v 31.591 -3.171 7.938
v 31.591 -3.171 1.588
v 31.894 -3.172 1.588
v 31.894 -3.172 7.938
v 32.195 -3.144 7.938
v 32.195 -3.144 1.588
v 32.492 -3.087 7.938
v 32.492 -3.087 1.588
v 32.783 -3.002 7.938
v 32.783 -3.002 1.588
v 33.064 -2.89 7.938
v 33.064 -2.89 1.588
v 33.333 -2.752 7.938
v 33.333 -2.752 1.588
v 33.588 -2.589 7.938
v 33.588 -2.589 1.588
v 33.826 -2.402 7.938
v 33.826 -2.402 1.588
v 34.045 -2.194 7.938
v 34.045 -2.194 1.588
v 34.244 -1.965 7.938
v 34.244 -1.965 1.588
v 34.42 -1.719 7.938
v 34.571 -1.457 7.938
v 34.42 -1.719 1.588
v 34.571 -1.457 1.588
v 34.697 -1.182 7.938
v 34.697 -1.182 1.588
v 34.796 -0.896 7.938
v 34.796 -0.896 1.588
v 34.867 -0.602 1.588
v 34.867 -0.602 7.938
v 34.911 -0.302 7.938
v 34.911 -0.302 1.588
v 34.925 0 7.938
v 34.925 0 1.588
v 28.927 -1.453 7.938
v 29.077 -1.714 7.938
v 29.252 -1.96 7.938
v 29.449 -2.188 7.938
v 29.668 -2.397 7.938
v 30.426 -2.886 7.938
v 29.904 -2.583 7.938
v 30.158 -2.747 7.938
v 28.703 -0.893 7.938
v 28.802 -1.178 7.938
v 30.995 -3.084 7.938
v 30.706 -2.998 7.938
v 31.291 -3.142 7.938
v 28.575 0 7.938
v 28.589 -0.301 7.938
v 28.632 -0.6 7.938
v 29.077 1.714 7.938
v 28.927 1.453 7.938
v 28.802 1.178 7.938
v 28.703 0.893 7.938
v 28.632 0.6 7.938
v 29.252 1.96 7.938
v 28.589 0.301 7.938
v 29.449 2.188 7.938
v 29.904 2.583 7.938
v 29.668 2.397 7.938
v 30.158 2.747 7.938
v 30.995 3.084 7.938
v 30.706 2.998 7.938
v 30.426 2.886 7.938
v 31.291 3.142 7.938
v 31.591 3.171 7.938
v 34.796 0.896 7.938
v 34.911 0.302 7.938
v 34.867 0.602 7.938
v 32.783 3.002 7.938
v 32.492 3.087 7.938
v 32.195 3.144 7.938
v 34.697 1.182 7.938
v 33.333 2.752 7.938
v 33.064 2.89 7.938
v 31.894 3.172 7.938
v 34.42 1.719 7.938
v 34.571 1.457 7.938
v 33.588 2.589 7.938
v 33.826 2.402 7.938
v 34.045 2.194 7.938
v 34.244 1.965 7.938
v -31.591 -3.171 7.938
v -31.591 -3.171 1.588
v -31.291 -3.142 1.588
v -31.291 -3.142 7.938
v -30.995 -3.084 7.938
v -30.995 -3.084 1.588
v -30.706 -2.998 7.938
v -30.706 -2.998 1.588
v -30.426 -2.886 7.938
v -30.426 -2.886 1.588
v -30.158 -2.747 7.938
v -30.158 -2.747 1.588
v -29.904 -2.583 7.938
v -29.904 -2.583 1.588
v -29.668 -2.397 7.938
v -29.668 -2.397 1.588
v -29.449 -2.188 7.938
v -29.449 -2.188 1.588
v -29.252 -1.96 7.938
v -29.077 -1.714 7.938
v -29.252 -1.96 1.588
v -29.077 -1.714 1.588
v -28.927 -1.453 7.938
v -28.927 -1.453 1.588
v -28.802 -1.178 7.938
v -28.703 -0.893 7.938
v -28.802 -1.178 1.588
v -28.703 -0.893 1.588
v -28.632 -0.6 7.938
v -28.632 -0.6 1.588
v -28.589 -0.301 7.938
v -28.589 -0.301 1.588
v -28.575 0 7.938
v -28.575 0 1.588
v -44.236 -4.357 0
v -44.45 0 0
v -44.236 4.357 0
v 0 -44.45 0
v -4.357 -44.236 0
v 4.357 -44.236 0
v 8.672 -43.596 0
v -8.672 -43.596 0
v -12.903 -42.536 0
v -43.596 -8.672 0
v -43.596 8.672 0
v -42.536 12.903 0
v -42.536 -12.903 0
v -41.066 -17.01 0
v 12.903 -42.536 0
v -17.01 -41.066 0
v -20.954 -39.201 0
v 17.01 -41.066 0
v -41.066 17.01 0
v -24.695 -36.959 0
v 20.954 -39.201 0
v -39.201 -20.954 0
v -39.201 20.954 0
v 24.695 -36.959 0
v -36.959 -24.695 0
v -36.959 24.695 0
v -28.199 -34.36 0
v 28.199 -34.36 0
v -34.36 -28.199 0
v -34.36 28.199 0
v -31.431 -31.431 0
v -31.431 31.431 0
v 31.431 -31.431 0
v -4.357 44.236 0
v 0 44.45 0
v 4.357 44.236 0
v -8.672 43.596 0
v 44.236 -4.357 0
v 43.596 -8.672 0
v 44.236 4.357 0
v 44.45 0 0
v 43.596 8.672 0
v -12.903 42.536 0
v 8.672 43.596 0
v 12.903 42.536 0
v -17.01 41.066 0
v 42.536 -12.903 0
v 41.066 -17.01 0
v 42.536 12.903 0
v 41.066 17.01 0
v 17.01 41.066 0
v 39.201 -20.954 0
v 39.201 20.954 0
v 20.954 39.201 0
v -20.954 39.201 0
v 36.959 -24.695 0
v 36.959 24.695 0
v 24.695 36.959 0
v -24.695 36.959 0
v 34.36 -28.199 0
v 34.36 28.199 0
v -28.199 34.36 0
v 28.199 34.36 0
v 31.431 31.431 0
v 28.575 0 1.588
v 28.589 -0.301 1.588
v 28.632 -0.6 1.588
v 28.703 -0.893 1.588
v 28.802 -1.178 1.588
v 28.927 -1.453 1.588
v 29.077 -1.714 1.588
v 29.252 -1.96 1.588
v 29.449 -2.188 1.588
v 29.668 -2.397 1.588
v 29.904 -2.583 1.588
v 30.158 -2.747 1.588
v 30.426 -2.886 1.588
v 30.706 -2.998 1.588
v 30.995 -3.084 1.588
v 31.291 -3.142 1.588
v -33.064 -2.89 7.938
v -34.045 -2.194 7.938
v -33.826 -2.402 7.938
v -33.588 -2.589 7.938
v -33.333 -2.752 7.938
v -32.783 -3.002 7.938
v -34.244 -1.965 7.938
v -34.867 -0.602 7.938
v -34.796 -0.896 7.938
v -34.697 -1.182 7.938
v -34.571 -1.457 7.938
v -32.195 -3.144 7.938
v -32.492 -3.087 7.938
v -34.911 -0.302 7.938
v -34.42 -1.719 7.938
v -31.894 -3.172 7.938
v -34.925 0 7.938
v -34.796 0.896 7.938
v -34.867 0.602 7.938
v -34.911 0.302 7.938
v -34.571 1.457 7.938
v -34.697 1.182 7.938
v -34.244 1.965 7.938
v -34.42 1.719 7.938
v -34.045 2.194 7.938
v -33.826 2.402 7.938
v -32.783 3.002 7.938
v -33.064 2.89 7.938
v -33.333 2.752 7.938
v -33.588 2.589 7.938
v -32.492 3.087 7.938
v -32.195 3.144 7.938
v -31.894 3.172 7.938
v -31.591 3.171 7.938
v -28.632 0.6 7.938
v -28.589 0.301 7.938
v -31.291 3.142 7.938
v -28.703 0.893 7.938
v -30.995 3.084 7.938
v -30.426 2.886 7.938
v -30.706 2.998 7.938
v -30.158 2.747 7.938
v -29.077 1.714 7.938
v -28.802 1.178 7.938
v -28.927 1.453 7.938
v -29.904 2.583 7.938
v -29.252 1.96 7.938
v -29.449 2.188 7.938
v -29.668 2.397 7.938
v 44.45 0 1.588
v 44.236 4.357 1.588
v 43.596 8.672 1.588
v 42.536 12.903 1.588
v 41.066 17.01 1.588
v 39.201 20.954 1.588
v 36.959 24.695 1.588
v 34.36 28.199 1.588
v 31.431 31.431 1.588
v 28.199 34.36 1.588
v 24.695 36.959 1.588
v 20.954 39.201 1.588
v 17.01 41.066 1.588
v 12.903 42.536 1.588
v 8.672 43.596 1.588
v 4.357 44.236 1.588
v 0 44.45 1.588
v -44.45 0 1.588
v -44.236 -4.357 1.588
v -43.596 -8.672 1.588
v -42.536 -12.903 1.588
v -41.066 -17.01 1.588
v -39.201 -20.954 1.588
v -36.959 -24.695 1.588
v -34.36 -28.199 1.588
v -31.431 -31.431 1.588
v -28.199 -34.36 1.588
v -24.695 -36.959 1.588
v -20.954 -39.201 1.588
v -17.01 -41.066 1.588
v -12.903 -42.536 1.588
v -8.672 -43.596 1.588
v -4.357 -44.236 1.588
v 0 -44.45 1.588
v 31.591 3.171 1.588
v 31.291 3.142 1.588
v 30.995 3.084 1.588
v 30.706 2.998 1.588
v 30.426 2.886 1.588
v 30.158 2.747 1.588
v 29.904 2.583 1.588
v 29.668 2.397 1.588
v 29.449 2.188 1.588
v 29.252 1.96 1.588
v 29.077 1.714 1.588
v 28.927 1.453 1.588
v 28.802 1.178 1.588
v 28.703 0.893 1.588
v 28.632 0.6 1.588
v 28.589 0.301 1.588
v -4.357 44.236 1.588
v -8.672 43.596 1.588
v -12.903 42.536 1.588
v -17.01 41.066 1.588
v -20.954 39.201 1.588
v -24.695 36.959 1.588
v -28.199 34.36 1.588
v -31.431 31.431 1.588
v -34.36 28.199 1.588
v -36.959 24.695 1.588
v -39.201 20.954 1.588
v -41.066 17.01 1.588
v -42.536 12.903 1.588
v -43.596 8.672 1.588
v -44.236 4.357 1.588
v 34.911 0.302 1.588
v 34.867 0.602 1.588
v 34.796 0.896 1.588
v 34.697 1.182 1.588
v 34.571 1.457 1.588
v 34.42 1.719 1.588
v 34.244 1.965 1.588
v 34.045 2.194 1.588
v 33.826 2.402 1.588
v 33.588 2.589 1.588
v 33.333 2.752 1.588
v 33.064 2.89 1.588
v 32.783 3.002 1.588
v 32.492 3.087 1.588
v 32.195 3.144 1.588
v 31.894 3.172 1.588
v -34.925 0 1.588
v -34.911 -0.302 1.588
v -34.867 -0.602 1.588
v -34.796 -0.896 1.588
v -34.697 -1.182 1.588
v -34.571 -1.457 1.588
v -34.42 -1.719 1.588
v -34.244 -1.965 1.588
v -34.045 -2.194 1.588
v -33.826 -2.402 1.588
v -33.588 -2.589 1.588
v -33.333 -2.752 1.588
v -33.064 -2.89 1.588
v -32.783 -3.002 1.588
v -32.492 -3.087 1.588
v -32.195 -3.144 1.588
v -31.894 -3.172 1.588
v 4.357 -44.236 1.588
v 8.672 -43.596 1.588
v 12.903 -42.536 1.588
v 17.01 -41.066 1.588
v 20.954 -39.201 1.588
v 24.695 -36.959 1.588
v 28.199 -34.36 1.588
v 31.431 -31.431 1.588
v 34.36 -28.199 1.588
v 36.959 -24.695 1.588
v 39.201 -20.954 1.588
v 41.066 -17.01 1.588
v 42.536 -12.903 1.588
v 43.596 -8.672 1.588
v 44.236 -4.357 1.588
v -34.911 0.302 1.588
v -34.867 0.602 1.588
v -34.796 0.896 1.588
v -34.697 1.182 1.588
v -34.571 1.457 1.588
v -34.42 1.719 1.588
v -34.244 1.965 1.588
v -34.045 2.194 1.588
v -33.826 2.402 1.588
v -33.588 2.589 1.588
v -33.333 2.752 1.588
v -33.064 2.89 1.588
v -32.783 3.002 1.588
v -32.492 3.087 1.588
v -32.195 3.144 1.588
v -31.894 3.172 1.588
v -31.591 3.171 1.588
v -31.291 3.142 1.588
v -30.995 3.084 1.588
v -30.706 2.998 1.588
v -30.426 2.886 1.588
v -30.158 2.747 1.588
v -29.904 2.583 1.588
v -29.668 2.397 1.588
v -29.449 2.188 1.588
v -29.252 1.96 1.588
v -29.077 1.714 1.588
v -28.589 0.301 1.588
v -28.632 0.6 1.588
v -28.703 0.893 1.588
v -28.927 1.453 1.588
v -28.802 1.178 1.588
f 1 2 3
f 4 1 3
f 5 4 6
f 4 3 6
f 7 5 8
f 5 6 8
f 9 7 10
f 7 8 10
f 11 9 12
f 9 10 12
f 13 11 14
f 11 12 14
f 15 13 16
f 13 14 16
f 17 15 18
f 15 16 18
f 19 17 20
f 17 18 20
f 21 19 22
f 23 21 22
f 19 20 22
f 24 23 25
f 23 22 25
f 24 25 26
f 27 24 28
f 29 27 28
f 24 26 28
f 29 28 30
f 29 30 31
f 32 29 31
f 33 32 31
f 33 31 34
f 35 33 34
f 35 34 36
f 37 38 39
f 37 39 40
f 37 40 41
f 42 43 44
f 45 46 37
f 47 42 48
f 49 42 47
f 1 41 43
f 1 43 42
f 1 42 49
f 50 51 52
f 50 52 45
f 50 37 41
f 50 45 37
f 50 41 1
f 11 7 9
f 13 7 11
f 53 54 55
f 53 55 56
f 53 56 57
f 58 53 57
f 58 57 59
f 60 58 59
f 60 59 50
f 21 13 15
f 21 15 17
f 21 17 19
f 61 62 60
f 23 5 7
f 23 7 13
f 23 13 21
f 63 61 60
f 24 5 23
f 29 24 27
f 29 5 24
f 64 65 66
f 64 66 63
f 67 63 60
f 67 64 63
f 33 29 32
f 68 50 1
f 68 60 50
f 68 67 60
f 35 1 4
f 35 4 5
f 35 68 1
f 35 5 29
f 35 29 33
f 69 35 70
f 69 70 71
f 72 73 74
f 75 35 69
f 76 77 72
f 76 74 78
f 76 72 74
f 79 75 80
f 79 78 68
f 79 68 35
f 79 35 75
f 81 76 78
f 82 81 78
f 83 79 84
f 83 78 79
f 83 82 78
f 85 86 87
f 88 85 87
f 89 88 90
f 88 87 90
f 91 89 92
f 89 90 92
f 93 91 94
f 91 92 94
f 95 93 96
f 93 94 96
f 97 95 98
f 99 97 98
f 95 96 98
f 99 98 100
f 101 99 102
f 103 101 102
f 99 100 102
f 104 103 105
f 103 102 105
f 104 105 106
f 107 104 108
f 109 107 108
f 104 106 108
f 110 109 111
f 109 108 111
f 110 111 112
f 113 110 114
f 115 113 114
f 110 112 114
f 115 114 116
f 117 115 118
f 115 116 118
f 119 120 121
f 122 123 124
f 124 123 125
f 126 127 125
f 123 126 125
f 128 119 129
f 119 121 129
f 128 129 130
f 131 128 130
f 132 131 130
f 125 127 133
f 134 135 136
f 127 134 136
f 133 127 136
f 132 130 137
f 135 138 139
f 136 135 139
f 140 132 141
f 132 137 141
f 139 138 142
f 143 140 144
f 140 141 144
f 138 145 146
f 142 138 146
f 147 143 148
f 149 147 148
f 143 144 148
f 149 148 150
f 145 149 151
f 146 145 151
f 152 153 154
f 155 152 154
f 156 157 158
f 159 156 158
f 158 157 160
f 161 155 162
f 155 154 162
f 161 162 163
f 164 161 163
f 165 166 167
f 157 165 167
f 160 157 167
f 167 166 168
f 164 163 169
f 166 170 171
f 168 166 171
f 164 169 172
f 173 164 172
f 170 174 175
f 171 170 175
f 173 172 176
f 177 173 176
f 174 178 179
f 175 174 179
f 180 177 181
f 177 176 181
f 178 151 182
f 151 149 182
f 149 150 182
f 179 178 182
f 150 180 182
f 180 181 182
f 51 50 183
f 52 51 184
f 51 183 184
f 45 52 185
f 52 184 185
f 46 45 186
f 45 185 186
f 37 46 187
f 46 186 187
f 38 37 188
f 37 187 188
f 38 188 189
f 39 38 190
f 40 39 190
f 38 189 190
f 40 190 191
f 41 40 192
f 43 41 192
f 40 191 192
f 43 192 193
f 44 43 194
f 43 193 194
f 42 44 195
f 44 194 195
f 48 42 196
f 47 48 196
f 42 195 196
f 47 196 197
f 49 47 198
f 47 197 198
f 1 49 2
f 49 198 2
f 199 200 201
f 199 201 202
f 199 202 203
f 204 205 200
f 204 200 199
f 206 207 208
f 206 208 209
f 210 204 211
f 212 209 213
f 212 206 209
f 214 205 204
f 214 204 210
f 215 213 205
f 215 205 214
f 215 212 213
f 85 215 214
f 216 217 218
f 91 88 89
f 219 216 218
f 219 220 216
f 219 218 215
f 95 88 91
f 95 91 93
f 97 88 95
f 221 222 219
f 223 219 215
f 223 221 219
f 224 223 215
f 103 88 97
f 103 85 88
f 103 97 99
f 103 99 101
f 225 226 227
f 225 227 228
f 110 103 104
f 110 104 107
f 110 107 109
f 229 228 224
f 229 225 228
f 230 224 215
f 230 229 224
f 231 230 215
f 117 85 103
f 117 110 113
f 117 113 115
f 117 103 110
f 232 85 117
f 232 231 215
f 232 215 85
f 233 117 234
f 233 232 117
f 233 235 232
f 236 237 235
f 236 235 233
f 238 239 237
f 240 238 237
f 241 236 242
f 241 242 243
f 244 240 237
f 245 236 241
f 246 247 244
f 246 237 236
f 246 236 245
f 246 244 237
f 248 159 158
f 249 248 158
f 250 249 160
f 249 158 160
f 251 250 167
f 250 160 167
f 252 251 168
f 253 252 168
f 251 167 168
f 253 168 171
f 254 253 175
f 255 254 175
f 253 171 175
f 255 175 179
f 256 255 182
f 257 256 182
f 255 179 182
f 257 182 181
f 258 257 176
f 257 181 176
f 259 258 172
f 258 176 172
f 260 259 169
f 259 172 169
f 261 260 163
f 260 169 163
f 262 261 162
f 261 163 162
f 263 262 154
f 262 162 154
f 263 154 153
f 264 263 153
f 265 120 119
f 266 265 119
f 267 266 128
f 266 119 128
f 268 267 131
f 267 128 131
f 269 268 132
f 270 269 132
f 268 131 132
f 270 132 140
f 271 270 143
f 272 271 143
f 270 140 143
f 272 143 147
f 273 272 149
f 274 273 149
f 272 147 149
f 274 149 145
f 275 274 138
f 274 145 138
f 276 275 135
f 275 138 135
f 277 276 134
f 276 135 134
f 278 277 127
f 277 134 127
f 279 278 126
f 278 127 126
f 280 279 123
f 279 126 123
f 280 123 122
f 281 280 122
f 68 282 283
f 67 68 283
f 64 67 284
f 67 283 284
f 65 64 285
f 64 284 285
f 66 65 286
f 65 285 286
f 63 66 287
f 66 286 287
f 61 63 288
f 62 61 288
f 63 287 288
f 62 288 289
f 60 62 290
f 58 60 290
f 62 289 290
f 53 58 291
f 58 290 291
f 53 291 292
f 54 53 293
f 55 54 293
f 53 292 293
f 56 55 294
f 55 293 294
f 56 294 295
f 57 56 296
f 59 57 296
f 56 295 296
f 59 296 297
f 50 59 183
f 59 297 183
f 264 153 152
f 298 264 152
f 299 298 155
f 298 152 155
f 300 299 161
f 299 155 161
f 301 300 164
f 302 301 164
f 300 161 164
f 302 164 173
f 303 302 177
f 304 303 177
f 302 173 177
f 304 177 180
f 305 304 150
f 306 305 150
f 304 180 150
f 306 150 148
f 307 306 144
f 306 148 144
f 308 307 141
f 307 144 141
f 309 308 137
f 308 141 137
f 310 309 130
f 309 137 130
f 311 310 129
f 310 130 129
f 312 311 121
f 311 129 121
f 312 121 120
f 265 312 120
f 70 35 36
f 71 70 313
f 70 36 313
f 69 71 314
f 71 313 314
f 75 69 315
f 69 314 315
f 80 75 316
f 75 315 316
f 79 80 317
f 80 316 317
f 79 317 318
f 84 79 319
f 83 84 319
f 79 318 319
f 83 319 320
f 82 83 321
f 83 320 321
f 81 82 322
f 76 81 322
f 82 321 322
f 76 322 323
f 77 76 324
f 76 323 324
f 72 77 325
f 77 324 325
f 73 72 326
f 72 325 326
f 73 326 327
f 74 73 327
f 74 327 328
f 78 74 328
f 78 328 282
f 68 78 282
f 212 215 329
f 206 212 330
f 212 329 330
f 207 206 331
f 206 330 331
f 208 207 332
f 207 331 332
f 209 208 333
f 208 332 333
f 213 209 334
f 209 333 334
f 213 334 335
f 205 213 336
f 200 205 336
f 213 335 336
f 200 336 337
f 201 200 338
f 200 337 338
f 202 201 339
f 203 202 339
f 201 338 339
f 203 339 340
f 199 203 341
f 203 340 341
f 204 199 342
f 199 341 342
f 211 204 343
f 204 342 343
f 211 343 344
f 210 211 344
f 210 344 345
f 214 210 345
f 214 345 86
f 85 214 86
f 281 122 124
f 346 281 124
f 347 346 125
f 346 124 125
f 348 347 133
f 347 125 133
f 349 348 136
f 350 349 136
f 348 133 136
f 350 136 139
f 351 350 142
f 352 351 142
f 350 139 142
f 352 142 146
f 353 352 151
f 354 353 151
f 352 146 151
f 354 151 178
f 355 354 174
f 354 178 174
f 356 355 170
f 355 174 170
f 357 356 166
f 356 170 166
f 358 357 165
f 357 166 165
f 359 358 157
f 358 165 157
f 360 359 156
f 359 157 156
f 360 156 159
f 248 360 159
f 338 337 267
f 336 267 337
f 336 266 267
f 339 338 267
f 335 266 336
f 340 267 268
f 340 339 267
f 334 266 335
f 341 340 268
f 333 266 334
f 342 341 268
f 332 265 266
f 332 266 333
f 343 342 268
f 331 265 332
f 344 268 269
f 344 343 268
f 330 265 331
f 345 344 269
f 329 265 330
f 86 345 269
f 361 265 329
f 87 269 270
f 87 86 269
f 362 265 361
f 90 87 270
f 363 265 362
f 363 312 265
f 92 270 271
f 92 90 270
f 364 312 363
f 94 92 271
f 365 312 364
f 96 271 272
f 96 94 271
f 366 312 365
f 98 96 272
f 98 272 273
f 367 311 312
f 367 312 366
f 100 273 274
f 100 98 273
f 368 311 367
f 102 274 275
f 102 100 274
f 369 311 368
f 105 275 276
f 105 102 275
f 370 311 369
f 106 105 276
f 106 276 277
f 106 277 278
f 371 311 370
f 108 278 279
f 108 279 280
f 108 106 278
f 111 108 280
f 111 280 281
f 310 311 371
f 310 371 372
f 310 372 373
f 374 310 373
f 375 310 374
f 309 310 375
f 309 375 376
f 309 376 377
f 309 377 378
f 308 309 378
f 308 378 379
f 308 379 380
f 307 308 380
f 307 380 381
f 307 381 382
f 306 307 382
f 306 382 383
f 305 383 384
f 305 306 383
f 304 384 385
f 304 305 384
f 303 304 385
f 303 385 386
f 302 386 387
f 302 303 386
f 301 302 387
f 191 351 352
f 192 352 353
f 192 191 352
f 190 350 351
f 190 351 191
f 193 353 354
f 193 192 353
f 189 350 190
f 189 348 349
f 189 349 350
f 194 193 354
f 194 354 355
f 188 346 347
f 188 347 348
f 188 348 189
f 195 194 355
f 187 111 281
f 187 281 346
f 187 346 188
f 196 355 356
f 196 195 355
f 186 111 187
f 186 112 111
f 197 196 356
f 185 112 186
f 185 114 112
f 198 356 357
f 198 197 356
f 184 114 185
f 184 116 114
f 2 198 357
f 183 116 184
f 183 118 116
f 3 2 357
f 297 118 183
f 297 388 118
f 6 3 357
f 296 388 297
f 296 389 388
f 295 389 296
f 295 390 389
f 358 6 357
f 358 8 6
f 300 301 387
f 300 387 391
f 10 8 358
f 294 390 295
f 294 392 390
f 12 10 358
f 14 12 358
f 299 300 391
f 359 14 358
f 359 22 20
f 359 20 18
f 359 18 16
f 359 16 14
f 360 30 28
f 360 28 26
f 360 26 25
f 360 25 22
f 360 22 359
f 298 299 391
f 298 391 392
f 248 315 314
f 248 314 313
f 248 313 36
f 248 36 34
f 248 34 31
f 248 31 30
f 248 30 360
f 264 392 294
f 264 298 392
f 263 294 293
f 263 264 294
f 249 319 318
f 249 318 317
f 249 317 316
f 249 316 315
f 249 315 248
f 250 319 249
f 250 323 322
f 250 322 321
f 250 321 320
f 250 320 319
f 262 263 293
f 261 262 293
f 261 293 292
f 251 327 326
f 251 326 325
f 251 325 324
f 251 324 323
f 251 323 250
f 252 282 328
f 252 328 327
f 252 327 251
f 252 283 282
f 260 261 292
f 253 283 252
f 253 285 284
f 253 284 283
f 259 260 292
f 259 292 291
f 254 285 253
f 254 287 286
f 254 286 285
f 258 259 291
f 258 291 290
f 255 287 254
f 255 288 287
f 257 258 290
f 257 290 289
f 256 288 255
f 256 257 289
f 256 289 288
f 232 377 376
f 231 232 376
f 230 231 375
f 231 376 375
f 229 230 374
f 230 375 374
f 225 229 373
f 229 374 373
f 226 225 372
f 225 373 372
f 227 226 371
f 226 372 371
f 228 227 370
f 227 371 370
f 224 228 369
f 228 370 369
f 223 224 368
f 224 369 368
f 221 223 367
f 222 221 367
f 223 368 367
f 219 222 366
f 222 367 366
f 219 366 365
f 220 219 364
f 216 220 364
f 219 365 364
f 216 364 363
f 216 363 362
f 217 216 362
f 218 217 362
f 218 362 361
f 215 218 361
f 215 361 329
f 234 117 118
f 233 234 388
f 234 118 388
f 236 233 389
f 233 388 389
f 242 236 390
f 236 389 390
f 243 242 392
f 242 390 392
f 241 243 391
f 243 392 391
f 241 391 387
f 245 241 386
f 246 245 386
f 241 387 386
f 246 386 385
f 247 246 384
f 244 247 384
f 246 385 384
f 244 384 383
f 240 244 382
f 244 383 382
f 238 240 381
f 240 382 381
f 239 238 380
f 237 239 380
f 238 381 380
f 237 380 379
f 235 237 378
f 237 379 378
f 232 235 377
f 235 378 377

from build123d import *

# Parameters (mm, degrees)
F1_DEPTH = 1.5875
F2_DEPTH = 7.9375


with BuildPart() as f1:
    # F0 (on Top) → F1 (new body)
    with BuildSketch(Plane.XY):
        with BuildLine():
            ThreePointArc((-44.45, 0), (-31.4308964237, -31.4308964237), (0, -44.45))
            Line((0, -44.45), (0, -31.75))
            ThreePointArc((0, -31.75), (-21.3000274256, -23.5450914559), (-31.59125, -3.1710287664))
            ThreePointArc((-31.59125, -3.1710287664), (-33.9382177394, -2.3005060585), (-34.925, 0))
            Line((-34.925, 0), (-44.45, 0))
        make_face()
        with BuildLine():
            ThreePointArc((-31.59125, -3.1710287664), (-21.3000274256, -23.5450914559), (0, -31.75))
            Line((0, -31.75), (0, 0))
            Line((0, 0), (-28.575, 0))
            ThreePointArc((-28.575, 0), (-29.4494939415, -2.1882177394), (-31.59125, -3.1710287664))
        make_face()
        with BuildLine():
            Line((0, 0), (0, -31.75))
            ThreePointArc((0, -31.75), (21.3000274256, -23.5450914559), (31.59125, -3.1710287664))
            ThreePointArc((31.59125, -3.1710287664), (29.4494939415, -2.1882177394), (28.575, 0))
            Line((28.575, 0), (0, 0))
        make_face()
        with BuildLine():
            ThreePointArc((0, -44.45), (31.4308964237, -31.4308964237), (44.45, 0))
            Line((44.45, 0), (34.925, 0))
            ThreePointArc((34.925, 0), (33.9382177394, -2.3005060585), (31.59125, -3.1710287664))
            ThreePointArc((31.59125, -3.1710287664), (21.3000274256, -23.5450914559), (0, -31.75))
            Line((0, -31.75), (0, -44.45))
        make_face()
        with BuildLine():
            Line((34.925, 0), (44.45, 0))
            ThreePointArc((44.45, 0), (31.4308964237, 31.4308964237), (0, 44.45))
            Line((0, 44.45), (0, 31.75))
            ThreePointArc((0, 31.75), (21.3000274256, 23.5450914559), (31.59125, 3.1710287664))
            ThreePointArc((31.59125, 3.1710287664), (33.9382177394, 2.3005060585), (34.925, 0))
        make_face()
        with BuildLine():
            ThreePointArc((31.59125, 3.1710287664), (21.3000274256, 23.5450914559), (0, 31.75))
            Line((0, 31.75), (0, 0))
            Line((0, 0), (28.575, 0))
            ThreePointArc((28.575, 0), (29.4494939415, 2.1882177394), (31.59125, 3.1710287664))
        make_face()
        with BuildLine():
            Line((0, 0), (0, 31.75))
            ThreePointArc((0, 31.75), (-21.3000274256, 23.5450914559), (-31.59125, 3.1710287664))
            ThreePointArc((-31.59125, 3.1710287664), (-29.4494939415, 2.1882177394), (-28.575, 0))
            Line((-28.575, 0), (0, 0))
        make_face()
        with BuildLine():
            Line((0, 31.75), (0, 44.45))
            ThreePointArc((0, 44.45), (-31.4308964237, 31.4308964237), (-44.45, 0))
            Line((-44.45, 0), (-34.925, 0))
            ThreePointArc((-34.925, 0), (-33.9382177394, 2.3005060585), (-31.59125, 3.1710287664))
            ThreePointArc((-31.59125, 3.1710287664), (-21.3000274256, 23.5450914559), (0, 31.75))
        make_face()
    extrude(amount=F1_DEPTH)

    # F0 (on Top) → F2 (join)
    with BuildSketch(Plane.XY):
        with BuildLine():
            ThreePointArc((-31.59125, 3.1710287664), (-33.9382177394, 2.3005060585), (-34.925, 0))
            ThreePointArc((-34.925, 0), (-33.9382177394, -2.3005060585), (-31.59125, -3.1710287664))
            ThreePointArc((-31.59125, -3.1710287664), (-29.4494939415, -2.1882177394), (-28.575, 0))
            ThreePointArc((-28.575, 0), (-29.4494939415, 2.1882177394), (-31.59125, 3.1710287664))
        make_face()
        with BuildLine():
            ThreePointArc((31.59125, -3.1710287664), (33.9382177394, -2.3005060585), (34.925, 0))
            ThreePointArc((34.925, 0), (33.9382177394, 2.3005060585), (31.59125, 3.1710287664))
            ThreePointArc((31.59125, 3.1710287664), (29.4494939415, 2.1882177394), (28.575, 0))
            ThreePointArc((28.575, 0), (29.4494939415, -2.1882177394), (31.59125, -3.1710287664))
        make_face()
    extrude(amount=F2_DEPTH)


solid = f1.part
